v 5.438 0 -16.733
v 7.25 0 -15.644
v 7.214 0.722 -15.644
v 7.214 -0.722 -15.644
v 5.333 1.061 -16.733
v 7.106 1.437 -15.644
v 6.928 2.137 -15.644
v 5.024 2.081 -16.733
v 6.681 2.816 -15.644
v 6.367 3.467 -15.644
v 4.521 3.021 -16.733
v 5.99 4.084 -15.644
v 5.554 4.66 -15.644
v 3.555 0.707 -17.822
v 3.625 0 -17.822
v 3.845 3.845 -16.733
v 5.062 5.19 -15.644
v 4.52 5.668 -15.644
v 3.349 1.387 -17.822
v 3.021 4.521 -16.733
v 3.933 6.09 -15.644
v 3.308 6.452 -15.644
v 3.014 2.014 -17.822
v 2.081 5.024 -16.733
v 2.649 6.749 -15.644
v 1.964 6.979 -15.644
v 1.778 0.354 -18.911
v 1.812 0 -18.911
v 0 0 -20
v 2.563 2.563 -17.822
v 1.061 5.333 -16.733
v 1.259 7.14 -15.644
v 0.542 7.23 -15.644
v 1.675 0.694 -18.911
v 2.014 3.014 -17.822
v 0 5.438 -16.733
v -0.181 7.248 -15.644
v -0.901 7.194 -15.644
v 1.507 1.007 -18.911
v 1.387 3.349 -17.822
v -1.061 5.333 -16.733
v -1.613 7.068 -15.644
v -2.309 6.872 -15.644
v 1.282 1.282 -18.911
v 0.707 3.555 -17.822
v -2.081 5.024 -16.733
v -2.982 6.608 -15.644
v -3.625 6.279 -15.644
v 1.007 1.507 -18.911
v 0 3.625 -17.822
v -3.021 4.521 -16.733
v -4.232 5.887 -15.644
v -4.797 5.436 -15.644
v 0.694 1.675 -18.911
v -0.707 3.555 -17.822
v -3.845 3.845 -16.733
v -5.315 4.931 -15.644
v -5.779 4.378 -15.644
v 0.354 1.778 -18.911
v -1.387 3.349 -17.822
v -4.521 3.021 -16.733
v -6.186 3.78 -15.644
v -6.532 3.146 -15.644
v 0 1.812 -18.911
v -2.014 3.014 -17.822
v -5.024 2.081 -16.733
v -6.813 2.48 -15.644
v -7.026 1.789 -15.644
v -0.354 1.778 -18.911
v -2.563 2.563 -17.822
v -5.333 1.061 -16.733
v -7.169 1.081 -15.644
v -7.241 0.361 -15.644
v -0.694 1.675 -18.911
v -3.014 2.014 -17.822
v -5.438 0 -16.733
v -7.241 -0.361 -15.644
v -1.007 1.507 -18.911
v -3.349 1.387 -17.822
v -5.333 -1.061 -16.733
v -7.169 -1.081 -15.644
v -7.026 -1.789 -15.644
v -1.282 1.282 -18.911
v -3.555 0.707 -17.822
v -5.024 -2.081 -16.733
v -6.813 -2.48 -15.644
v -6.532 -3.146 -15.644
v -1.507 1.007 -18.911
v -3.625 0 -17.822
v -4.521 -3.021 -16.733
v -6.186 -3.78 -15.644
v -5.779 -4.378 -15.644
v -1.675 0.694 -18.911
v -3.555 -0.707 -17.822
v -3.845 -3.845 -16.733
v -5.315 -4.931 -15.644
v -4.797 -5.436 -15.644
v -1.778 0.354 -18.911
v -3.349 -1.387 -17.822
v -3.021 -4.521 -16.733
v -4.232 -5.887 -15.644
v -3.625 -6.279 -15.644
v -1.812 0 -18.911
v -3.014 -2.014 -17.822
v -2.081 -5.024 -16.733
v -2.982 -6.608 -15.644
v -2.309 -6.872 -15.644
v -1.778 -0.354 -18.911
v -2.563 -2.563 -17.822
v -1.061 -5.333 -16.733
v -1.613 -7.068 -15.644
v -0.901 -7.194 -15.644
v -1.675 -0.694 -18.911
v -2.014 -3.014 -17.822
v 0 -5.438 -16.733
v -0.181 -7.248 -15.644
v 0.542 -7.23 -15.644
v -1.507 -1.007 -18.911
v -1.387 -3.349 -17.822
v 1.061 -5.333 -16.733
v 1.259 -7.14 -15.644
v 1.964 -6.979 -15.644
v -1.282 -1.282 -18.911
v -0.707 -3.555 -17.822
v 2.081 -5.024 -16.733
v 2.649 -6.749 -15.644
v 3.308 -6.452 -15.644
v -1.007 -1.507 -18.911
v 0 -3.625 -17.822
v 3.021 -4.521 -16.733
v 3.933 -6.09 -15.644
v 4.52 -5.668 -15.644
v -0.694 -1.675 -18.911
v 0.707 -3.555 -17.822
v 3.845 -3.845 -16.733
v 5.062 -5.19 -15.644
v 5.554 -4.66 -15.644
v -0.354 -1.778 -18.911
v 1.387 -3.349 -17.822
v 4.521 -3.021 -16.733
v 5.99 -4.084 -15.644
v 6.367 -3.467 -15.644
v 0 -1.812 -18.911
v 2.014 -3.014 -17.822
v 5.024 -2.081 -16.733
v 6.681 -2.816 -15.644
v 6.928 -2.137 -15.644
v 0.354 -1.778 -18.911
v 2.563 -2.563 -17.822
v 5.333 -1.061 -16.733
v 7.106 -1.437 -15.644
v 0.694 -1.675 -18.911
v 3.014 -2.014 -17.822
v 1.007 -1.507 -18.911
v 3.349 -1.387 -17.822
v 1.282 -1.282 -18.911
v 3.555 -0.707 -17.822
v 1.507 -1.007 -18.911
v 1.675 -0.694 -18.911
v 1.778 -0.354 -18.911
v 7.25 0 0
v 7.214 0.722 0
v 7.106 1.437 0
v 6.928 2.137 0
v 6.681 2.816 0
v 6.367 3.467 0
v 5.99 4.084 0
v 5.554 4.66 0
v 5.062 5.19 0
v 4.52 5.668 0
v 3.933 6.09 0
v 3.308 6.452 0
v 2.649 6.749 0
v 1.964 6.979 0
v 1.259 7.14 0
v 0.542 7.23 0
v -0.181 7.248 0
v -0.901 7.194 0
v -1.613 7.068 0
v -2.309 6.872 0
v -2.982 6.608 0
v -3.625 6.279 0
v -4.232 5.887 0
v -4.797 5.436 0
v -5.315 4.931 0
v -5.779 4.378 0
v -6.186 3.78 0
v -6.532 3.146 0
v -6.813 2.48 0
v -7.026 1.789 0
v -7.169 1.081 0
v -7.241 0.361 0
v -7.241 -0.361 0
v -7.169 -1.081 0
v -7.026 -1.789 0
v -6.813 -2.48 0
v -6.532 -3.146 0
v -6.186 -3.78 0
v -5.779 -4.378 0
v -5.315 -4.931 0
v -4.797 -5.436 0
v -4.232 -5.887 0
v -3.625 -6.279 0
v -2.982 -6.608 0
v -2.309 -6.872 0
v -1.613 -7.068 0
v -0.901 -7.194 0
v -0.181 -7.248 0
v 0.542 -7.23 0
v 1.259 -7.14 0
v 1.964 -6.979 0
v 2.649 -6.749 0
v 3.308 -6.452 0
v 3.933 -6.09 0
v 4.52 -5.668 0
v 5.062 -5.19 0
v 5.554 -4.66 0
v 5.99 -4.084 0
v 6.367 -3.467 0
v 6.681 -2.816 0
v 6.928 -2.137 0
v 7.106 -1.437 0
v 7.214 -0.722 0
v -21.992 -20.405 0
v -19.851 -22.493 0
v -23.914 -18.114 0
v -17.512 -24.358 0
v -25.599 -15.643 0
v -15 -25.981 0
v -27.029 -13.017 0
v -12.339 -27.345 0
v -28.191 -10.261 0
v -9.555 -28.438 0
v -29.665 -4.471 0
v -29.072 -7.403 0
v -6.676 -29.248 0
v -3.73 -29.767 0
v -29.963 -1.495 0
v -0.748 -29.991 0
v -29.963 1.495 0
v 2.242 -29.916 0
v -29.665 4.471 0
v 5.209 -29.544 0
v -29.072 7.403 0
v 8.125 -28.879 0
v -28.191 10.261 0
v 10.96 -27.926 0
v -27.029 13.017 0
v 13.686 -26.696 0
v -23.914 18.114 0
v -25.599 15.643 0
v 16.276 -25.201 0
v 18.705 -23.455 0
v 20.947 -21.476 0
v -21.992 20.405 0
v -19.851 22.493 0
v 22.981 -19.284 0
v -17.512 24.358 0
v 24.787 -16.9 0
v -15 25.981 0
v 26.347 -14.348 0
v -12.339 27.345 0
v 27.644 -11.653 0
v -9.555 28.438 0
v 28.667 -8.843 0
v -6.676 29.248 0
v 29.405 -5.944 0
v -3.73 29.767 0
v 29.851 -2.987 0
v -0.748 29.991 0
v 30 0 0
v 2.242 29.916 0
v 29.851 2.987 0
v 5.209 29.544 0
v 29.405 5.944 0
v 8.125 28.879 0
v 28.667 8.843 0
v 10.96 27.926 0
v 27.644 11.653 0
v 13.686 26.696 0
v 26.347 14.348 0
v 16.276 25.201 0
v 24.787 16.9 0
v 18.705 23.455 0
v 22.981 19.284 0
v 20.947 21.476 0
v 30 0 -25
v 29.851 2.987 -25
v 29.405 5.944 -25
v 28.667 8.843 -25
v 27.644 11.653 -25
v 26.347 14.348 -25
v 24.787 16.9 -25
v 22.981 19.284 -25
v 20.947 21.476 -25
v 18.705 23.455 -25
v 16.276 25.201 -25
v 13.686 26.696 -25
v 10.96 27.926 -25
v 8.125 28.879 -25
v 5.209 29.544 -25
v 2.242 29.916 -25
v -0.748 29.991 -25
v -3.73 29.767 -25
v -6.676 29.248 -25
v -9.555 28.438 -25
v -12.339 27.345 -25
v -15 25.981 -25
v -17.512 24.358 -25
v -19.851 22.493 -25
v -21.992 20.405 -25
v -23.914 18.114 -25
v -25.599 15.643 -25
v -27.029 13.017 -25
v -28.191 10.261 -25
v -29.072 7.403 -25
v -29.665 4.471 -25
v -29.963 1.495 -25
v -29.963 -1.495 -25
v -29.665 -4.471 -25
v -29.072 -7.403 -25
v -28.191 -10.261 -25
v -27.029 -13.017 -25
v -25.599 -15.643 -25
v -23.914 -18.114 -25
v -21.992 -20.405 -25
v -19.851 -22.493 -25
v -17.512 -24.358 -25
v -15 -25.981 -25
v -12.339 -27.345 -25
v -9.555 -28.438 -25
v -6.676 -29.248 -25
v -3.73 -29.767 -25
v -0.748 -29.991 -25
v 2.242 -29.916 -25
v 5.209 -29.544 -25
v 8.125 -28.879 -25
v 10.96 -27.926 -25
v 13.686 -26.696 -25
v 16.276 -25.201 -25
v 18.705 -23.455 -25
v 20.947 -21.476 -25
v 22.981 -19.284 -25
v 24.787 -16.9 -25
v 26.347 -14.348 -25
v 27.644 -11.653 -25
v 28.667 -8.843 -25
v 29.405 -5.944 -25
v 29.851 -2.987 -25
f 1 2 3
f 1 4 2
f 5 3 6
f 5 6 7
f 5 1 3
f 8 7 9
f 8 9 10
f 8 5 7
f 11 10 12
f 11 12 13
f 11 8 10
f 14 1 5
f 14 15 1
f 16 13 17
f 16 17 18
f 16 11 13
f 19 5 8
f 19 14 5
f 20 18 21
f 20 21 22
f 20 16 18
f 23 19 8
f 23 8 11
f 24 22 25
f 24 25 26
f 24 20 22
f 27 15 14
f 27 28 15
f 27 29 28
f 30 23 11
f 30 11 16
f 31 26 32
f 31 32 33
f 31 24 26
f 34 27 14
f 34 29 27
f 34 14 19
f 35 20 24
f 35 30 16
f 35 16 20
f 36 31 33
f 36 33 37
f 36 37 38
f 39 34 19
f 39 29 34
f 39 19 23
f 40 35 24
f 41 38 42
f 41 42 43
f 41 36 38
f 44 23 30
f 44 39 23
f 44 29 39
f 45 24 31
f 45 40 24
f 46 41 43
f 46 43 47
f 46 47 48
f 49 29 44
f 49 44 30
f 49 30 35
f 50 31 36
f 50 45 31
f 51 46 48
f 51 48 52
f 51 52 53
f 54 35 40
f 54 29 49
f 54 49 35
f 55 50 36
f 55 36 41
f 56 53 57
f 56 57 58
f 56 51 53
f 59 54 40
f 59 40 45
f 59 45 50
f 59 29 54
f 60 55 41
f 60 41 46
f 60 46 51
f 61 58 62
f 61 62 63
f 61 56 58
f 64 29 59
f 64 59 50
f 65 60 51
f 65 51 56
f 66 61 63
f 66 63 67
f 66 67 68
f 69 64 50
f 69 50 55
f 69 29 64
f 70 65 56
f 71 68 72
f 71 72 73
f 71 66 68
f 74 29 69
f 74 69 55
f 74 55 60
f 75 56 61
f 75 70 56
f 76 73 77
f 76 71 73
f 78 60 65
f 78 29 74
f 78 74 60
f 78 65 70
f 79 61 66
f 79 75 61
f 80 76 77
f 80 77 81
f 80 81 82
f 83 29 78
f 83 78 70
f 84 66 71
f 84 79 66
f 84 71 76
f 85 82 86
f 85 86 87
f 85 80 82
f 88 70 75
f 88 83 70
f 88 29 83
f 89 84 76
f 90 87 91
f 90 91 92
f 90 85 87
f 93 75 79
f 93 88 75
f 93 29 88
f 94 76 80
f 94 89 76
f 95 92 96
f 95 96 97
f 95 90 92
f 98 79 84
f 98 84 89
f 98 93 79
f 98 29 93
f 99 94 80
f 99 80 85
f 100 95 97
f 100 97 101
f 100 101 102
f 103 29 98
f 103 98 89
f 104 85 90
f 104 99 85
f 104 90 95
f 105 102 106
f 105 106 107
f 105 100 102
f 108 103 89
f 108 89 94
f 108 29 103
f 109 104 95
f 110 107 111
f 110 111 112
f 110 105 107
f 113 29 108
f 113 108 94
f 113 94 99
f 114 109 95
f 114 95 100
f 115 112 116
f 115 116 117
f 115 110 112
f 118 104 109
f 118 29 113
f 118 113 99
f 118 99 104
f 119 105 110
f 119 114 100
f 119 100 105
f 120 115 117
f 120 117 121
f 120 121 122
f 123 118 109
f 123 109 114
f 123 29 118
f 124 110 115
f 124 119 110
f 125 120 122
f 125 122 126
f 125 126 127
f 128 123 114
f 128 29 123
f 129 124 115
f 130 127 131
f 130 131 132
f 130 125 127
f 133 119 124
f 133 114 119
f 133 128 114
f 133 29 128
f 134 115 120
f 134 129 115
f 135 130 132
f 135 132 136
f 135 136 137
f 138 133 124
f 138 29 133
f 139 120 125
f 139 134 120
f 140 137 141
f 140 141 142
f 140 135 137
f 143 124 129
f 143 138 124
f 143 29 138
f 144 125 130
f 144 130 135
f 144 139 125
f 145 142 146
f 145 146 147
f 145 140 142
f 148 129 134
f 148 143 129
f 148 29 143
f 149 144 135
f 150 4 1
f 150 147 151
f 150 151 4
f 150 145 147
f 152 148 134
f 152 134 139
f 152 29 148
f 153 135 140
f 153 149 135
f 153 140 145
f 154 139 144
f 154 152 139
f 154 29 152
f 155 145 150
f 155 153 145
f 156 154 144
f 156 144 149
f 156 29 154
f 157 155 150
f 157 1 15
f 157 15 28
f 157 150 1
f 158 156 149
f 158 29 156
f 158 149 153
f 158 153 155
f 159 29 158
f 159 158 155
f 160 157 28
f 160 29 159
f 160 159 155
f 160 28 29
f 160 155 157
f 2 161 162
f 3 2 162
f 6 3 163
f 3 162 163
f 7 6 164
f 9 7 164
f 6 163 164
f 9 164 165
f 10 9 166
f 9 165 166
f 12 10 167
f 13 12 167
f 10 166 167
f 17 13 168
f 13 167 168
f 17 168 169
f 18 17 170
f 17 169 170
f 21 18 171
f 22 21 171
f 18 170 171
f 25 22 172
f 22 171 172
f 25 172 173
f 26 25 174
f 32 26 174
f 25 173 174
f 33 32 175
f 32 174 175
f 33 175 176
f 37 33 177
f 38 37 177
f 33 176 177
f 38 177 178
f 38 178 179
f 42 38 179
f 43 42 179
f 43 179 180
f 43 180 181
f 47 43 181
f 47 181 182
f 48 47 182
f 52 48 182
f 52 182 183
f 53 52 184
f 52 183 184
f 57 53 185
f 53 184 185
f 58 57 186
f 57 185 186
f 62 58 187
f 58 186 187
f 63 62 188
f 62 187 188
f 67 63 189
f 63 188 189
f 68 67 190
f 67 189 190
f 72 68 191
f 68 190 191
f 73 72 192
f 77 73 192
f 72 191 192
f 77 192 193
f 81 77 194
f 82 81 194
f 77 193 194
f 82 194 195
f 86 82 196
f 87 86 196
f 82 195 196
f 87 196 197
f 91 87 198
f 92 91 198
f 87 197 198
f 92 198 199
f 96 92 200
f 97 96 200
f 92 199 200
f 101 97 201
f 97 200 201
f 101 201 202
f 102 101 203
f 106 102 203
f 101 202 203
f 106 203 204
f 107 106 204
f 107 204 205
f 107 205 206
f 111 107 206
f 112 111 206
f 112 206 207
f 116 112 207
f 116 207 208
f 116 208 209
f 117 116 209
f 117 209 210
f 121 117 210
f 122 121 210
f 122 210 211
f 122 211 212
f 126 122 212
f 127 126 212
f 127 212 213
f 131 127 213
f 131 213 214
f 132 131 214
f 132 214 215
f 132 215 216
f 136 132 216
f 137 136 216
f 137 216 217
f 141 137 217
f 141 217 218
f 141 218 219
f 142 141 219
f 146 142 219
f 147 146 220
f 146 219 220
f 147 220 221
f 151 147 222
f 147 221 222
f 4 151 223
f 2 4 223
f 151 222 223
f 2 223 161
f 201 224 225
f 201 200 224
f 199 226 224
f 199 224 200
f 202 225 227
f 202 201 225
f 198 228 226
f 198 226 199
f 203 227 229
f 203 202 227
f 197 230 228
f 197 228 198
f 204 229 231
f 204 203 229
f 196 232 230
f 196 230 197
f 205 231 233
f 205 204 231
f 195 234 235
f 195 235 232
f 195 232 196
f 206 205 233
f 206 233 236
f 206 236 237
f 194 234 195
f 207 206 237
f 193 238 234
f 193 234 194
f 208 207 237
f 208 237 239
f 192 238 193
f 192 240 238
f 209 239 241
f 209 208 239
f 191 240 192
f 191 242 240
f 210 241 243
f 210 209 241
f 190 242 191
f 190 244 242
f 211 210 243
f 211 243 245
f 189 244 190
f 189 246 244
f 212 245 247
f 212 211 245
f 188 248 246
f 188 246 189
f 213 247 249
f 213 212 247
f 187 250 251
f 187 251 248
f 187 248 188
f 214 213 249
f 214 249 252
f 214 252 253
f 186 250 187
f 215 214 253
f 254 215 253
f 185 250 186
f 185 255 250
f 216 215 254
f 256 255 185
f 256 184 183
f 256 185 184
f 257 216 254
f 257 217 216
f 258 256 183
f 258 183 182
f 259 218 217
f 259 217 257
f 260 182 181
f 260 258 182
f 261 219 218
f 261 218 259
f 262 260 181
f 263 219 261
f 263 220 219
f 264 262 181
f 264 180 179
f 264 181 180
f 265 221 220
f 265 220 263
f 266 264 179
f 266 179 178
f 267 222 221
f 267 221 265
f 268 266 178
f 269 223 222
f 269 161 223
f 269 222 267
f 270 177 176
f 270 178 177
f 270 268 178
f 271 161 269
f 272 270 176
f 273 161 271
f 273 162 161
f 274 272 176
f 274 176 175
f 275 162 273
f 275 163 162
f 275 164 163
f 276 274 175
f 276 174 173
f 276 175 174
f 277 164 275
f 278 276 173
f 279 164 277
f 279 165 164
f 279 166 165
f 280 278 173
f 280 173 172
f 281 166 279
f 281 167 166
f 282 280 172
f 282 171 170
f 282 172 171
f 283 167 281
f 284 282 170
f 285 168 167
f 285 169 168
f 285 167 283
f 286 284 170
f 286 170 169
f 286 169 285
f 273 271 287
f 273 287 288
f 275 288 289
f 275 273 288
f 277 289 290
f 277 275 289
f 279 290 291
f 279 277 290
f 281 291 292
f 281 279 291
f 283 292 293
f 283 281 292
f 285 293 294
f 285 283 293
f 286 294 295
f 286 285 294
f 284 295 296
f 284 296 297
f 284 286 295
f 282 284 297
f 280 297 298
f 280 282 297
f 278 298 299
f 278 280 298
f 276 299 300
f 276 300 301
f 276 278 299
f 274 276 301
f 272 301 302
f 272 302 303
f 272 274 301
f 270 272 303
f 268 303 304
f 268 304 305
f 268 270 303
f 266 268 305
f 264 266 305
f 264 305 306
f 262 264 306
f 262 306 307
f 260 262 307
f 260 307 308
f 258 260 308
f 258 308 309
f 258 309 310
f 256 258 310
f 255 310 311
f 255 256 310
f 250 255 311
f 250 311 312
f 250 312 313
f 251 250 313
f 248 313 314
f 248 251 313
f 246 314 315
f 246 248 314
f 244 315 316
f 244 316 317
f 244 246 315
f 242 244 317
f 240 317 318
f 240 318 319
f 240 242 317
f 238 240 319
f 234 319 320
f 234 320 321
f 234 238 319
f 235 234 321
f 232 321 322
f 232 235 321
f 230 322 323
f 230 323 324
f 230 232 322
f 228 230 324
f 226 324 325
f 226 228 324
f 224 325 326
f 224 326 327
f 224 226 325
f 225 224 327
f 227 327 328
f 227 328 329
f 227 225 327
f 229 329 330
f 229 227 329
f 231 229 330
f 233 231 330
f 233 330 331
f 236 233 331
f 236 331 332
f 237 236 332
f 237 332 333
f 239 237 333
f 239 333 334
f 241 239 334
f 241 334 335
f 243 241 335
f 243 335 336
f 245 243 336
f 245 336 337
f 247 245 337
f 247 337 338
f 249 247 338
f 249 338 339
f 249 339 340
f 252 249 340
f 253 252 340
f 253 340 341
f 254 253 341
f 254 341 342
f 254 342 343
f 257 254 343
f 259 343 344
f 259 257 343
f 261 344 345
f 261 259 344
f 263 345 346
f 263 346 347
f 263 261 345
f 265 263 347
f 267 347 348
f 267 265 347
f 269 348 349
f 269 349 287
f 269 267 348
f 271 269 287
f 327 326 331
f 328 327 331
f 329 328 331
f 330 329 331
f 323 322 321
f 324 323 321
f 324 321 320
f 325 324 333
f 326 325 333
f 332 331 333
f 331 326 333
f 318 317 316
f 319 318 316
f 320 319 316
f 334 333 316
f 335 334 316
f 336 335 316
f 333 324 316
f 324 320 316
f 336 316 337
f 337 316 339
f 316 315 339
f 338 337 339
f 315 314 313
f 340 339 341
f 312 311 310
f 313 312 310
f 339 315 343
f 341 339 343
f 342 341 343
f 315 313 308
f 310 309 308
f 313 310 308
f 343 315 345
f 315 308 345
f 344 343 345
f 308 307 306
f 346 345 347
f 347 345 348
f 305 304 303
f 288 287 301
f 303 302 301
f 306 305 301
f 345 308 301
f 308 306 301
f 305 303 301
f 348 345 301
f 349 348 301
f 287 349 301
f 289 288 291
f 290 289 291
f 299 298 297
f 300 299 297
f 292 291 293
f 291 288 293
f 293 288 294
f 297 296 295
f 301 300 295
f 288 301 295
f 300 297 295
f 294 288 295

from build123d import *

# Parameters (mm, degrees)
SKETCH_R    = 30
PAD_DEPTH   = 25
SKETCH001_R = 7.25
HOLE_DEPTH  = 15.643761
HOLE_TIPS_R = 7.25


with BuildPart() as part:
    # Sketch → Pad (new body)
    with BuildSketch(Plane.XY):
        Circle(SKETCH_R)
    extrude(amount=-PAD_DEPTH)

    # Sketch001 (on Face2 of Pad) → Hole (cut)
    with BuildSketch(Plane.XY):
        Circle(SKETCH001_R)
    extrude(amount=-HOLE_DEPTH, mode=Mode.SUBTRACT)

    # Hole tips → Hole tip 1 section 0
    with BuildSketch(Plane.XY.offset(-15.643761), mode=Mode.PRIVATE) as hole_tip_1_s0:
        Circle(HOLE_TIPS_R)
    loft([hole_tip_1_s0.sketch, Vertex(0, 0, -20)], mode=Mode.SUBTRACT)


solid = part.part
